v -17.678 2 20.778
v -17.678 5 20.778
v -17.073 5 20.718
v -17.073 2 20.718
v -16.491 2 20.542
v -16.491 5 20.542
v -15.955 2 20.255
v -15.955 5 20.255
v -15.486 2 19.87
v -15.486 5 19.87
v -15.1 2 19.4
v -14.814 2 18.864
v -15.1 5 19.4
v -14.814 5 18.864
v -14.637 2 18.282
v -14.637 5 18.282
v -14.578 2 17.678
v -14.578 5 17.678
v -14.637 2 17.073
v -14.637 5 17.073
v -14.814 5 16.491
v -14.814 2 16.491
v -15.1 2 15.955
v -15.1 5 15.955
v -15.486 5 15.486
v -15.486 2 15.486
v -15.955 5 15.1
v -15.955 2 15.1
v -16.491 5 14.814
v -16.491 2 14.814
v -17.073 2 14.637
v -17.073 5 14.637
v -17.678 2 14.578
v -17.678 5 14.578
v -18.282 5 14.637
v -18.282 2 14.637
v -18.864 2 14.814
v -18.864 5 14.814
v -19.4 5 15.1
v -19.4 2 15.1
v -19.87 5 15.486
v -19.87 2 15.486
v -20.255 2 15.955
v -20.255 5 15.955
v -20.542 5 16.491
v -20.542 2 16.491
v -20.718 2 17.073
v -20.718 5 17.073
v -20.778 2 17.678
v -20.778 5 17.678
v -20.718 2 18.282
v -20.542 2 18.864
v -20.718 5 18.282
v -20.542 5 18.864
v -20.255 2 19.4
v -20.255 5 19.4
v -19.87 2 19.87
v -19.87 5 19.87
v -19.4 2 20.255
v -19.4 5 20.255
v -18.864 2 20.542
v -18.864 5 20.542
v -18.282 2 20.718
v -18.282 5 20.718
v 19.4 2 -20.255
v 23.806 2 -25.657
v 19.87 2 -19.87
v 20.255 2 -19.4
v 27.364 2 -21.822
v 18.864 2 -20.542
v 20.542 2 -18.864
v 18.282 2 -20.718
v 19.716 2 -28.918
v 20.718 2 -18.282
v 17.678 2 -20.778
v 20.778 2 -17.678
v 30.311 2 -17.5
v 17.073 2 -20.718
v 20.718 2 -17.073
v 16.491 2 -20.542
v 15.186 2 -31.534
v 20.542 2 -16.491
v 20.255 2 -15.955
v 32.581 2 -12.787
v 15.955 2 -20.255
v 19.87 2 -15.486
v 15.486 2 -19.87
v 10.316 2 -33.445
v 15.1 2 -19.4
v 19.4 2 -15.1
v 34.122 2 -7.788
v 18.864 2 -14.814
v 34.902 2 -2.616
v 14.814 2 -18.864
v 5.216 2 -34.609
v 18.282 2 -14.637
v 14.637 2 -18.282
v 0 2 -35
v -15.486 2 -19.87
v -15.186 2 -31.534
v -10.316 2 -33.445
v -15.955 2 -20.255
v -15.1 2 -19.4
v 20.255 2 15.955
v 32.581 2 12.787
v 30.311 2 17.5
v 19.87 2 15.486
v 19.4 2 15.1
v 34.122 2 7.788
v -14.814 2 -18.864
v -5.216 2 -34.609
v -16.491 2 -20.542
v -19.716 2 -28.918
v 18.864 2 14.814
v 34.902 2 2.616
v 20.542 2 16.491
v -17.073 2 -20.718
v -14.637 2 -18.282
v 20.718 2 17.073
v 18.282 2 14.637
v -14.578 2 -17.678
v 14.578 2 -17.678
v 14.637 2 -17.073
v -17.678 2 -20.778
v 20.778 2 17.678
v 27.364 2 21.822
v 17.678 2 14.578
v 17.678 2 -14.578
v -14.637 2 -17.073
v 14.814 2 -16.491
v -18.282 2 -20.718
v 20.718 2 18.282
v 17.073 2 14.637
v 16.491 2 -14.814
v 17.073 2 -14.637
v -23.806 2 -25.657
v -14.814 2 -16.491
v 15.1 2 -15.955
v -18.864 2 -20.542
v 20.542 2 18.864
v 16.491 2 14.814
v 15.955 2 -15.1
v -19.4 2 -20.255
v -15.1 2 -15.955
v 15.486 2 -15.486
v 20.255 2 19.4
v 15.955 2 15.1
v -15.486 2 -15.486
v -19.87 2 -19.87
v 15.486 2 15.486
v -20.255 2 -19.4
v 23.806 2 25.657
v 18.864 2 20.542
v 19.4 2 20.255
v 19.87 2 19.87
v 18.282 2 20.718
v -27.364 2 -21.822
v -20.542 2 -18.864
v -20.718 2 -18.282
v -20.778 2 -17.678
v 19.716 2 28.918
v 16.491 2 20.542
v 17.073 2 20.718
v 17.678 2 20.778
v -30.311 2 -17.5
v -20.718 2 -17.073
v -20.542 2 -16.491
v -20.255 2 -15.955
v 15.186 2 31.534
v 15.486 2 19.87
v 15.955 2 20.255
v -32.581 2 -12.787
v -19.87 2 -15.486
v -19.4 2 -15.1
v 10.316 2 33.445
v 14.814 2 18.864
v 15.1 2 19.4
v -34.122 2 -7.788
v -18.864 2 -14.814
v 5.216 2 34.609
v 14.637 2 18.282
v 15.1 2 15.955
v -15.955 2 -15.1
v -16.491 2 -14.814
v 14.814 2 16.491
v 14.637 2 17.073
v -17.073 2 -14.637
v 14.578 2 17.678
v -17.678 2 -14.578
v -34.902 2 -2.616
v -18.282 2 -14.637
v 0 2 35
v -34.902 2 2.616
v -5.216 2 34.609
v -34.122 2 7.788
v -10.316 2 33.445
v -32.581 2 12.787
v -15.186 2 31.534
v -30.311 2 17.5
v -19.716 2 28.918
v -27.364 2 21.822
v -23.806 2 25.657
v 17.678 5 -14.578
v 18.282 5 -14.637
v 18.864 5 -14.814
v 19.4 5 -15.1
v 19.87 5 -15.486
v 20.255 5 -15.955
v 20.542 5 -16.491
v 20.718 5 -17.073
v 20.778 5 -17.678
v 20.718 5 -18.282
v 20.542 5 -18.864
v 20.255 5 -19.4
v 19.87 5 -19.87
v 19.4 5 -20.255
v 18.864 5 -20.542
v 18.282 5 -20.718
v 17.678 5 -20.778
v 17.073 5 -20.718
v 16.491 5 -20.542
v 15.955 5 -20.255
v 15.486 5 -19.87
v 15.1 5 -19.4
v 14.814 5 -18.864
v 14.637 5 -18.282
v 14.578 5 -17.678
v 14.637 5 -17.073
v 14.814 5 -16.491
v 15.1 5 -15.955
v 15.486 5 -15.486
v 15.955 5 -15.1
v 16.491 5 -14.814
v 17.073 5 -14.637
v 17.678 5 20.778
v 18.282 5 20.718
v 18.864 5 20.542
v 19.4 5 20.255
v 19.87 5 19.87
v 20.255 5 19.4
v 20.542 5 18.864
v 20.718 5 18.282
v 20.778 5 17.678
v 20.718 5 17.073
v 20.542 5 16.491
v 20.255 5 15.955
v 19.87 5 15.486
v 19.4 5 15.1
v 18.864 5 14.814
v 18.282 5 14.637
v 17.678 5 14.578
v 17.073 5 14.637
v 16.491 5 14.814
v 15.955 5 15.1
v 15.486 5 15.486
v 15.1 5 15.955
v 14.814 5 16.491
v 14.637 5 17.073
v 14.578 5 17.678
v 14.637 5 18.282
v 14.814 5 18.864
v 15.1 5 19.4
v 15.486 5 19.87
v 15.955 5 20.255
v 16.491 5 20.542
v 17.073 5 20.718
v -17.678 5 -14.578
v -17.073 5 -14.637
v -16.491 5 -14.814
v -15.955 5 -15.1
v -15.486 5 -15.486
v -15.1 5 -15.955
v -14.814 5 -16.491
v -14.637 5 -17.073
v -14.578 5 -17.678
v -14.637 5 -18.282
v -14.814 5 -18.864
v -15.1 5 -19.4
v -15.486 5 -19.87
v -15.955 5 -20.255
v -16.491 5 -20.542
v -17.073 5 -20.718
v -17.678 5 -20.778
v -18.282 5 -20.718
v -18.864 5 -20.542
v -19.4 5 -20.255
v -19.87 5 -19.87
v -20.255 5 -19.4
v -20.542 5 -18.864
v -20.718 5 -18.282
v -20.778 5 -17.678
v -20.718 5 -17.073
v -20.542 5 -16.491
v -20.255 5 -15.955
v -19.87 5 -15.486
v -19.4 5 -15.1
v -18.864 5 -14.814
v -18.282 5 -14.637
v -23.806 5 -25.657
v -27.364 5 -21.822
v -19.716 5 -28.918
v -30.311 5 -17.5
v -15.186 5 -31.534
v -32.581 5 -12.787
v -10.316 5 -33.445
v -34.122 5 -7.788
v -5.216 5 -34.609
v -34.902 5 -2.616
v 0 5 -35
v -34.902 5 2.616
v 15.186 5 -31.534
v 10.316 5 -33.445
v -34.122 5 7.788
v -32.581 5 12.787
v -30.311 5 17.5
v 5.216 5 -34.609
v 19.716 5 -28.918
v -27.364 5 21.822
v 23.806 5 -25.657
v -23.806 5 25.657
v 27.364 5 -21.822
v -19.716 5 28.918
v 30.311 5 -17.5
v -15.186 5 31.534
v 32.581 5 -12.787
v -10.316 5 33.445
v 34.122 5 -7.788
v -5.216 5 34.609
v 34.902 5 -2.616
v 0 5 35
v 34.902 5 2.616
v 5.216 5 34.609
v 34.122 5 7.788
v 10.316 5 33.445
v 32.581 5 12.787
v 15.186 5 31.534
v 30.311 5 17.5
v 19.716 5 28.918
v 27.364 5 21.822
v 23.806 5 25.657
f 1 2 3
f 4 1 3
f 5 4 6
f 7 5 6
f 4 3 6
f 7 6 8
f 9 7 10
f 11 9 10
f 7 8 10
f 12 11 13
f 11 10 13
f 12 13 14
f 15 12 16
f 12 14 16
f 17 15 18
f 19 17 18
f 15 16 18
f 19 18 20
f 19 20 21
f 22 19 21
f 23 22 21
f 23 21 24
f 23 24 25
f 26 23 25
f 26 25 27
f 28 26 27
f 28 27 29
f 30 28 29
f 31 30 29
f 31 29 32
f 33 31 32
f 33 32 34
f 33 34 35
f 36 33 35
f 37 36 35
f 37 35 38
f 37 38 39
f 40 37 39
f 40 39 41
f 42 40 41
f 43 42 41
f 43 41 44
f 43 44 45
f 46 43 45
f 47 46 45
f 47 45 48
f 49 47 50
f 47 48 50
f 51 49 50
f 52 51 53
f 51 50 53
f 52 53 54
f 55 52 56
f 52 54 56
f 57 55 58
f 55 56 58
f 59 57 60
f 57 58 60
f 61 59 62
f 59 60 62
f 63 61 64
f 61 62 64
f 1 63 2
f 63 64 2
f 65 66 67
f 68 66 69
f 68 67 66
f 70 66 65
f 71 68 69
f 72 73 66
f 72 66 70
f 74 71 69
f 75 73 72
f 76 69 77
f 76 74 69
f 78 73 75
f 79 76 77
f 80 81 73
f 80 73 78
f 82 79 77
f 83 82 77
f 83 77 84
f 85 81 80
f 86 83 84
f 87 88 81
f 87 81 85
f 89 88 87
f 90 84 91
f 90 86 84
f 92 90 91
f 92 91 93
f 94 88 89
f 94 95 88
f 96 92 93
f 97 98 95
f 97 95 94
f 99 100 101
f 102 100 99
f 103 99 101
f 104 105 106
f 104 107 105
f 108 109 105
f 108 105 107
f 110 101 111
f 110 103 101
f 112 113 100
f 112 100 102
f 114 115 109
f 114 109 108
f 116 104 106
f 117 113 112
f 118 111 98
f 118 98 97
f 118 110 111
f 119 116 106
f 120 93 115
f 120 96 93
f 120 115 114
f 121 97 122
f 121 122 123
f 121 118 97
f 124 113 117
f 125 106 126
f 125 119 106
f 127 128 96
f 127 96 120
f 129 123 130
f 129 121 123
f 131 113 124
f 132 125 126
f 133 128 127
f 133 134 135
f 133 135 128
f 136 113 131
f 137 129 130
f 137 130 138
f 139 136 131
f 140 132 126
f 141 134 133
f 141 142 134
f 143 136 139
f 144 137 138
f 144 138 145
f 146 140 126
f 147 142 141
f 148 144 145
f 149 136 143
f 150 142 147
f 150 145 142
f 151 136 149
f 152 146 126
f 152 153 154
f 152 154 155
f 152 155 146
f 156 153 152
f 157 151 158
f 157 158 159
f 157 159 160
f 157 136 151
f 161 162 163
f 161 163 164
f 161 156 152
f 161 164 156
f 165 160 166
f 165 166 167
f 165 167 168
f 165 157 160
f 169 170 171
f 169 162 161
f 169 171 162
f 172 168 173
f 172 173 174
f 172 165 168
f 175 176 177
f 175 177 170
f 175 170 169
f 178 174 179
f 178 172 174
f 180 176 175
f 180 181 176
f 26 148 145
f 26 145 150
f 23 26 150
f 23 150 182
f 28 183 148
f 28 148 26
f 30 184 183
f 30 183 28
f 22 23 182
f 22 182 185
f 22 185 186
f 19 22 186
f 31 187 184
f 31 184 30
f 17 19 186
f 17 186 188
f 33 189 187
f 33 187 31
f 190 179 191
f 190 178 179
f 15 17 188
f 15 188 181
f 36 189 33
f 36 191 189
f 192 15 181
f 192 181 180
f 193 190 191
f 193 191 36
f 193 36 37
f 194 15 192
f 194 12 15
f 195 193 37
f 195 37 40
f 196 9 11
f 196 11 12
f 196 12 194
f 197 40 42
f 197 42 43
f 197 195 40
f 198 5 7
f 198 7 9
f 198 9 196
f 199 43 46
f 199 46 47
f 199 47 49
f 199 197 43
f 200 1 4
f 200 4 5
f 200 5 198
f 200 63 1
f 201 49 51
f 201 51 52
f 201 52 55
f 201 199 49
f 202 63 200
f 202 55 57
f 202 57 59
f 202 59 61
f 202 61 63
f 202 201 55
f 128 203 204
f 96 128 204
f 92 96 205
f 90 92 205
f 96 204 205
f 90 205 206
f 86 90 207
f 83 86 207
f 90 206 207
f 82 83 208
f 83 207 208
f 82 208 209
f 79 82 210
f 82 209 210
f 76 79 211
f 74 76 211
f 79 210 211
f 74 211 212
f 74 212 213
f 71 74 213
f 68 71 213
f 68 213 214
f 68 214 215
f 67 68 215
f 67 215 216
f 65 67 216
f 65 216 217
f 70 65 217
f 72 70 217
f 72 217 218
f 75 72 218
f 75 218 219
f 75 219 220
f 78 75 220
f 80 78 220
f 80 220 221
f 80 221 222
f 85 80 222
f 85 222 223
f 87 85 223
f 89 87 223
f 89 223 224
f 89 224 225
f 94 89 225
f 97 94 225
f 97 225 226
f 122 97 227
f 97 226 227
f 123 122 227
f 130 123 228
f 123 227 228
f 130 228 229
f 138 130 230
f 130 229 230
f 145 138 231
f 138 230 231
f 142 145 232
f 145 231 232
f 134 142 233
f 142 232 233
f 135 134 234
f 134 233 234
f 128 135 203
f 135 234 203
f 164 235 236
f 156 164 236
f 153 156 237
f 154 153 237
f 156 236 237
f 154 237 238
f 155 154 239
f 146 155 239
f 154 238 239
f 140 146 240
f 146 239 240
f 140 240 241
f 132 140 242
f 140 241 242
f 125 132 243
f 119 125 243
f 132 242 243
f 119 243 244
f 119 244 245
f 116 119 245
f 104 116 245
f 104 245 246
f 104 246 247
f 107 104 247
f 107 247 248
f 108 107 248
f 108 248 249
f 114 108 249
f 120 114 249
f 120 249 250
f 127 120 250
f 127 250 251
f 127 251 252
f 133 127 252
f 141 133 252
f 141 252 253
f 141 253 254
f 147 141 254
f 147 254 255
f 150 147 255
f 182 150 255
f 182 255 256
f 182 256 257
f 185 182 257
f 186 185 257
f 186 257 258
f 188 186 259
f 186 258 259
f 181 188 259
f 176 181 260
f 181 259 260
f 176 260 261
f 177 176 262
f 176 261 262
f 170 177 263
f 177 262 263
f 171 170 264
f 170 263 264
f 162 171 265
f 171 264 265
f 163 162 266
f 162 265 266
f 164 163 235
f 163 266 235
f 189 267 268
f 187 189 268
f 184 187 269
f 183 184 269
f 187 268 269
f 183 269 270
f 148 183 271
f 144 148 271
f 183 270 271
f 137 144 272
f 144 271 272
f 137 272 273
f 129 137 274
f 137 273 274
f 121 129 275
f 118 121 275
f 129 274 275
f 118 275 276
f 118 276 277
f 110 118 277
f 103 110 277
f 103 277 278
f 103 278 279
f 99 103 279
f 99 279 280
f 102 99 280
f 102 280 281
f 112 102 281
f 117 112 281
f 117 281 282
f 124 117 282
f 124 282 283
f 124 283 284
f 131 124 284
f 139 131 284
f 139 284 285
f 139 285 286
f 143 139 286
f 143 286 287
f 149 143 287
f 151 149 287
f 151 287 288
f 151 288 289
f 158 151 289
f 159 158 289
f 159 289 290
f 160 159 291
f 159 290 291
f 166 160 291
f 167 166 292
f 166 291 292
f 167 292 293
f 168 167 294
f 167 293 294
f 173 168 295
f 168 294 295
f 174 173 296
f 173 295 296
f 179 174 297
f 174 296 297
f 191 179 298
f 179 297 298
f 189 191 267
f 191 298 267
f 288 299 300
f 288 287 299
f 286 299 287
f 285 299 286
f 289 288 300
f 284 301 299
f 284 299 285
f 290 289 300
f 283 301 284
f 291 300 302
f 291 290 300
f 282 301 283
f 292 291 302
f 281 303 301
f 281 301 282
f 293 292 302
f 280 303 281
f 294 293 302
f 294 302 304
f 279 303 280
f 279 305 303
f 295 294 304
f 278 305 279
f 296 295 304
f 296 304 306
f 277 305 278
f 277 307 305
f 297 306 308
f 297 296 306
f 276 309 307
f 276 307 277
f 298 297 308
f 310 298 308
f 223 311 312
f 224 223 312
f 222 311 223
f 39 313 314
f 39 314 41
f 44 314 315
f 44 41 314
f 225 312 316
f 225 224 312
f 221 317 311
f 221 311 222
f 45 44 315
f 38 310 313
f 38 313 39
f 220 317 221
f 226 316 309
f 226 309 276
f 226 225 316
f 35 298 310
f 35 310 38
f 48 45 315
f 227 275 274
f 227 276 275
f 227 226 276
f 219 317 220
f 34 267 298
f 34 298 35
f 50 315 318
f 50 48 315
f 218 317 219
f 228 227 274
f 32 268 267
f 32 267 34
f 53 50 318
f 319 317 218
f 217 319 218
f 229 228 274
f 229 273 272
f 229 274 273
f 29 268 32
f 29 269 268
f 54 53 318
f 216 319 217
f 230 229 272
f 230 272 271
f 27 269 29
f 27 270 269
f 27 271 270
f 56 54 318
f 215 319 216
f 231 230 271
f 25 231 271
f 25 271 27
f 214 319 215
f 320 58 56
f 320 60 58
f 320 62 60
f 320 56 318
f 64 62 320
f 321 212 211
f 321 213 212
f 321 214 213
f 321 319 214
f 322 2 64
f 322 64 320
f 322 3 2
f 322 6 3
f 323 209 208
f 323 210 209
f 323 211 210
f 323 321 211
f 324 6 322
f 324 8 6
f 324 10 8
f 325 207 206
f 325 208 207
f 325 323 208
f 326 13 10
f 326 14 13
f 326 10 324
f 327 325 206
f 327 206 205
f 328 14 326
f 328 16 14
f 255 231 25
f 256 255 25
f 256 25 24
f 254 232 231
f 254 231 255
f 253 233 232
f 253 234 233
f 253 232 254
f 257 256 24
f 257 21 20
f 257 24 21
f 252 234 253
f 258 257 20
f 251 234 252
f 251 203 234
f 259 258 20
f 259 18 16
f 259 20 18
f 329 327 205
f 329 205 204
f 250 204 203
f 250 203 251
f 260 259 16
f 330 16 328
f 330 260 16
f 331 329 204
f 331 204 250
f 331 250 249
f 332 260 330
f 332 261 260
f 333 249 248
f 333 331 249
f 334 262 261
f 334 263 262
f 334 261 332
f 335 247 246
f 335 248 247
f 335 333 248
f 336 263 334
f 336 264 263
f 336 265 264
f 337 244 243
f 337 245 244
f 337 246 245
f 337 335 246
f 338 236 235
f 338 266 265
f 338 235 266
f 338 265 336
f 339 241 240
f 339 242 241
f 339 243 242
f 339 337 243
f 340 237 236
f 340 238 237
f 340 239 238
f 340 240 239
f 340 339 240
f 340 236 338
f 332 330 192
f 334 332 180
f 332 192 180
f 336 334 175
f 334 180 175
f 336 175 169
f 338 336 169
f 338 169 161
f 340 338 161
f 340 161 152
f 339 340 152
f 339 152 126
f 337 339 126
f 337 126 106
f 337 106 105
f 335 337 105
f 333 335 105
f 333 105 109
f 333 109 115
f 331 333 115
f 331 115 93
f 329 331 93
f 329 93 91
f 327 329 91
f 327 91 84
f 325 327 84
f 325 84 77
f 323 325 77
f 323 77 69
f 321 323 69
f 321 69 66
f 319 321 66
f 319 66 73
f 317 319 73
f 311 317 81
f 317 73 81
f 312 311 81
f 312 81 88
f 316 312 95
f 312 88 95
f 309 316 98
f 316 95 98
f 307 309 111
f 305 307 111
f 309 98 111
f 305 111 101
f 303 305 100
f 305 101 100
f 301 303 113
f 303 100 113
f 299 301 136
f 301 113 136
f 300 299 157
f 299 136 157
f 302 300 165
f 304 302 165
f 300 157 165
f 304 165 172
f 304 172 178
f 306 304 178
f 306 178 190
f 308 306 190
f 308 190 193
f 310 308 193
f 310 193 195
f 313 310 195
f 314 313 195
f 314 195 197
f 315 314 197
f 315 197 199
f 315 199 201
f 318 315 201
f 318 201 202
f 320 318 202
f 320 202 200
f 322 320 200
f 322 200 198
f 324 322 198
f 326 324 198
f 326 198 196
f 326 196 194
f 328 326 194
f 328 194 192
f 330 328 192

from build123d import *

# Parameters (mm, degrees)
SKETCH1_R           = 35
BOSS_EXTRUDE1_DEPTH = 5
SKETCH2_R           = 3.1
CUT_EXTRUDE1_DEPTH  = 50.749371855
SKETCH5_R           = 35
CUT_EXTRUDE4_DEPTH  = 2


with BuildPart() as part:
    # Sketch1 → Boss-Extrude1 (new body)
    with BuildSketch(Plane(origin=(0, 0, 0), x_dir=(1, 0, 0), z_dir=(0, 1, 0))):
        with Locations(Location((0, 0, 0), (0, 0, 270))):
            Circle(SKETCH1_R)
    extrude(amount=BOSS_EXTRUDE1_DEPTH)

    # Sketch2 → Cut-Extrude1 (cut, through all)
    with BuildSketch(Plane(origin=(0, 5, 0), x_dir=(1, 0, 0), z_dir=(0, 1, 0))):
        with Locations(Location((-17.67766953, 17.67766953, 0), (0, 0, 270))):
            Circle(SKETCH2_R)
        with Locations(Location((17.67766953, 17.67766953, 0), (0, 0, 270))):
            Circle(SKETCH2_R)
        with Locations(Location((17.67766953, -17.67766953, 0), (0, 0, 270))):
            Circle(SKETCH2_R)
        with Locations(Location((-17.67766953, -17.67766953, 0), (0, 0, 270))):
            Circle(SKETCH2_R)
    extrude(amount=-CUT_EXTRUDE1_DEPTH, mode=Mode.SUBTRACT)

    # Sketch5 → Cut-Extrude4 (cut)
    with BuildSketch(Plane.XZ):
        with Locations(Location((0, 0, 0), (0, 0, 90))):
            Circle(SKETCH5_R)
    extrude(amount=-CUT_EXTRUDE4_DEPTH, mode=Mode.SUBTRACT)


solid = part.part
